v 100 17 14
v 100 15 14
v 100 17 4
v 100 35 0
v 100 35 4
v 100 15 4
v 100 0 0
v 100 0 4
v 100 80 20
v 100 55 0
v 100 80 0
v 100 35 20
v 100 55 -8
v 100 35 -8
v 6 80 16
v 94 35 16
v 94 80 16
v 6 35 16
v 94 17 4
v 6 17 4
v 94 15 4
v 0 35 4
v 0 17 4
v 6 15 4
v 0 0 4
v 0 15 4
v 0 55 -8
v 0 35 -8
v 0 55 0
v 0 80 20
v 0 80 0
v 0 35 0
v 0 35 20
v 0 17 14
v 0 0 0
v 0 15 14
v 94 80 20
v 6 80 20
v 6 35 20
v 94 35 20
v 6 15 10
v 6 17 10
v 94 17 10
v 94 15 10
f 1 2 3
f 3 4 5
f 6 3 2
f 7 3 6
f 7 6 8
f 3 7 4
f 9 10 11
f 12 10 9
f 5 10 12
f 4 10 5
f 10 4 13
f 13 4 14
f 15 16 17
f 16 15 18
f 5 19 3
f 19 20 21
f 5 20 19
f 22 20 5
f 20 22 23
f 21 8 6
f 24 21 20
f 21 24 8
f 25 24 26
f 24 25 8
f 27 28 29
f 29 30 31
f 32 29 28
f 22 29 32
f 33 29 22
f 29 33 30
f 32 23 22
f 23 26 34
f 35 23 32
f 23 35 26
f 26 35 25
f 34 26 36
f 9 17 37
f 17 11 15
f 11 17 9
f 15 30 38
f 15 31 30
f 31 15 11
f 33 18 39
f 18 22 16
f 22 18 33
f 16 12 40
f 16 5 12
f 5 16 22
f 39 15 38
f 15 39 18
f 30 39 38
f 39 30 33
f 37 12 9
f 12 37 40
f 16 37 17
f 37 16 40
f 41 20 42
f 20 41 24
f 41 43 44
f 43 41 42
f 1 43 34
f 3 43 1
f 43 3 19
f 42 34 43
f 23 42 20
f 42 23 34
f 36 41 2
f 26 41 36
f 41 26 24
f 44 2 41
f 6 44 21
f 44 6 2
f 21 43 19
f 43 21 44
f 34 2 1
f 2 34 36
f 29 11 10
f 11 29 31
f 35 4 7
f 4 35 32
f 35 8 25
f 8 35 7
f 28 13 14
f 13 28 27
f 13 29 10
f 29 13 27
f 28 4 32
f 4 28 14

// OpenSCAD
// Parameters
base_width = 100;
base_depth = 80;
base_thickness = 4;

rear_raised_depth = 45;
rear_raised_height = 12;

side_strip_width = 6;
side_strip_height = 4;

transverse_y_pos = 15;
transverse_depth = 2;
transverse_height = 10;
transverse_opening_height = 6;

lower_step_depth = 20;
lower_step_drop = 8;

$fn = 100;

// Modules

// Main thin rectangular base slab
module base_slab() {
    cube([base_width, base_depth, base_thickness]);
}

// Raised section at the rear with side strips
module rear_raised_area() {
    // Larger raised rectangular portion at the rear
    translate([0, base_depth - rear_raised_depth, base_thickness])
        cube([base_width, rear_raised_depth, rear_raised_height]);
    
    // Narrow raised strip on the left side
    translate([0, base_depth - rear_raised_depth, base_thickness + rear_raised_height])
        cube([side_strip_width, rear_raised_depth, side_strip_height]);
        
    // Narrow raised strip on the right side
    translate([base_width - side_strip_width, base_depth - rear_raised_depth, base_thickness + rear_raised_height])
        cube([side_strip_width, rear_raised_depth, side_strip_height]);
}

// Very thin transverse added feature spanning across the width
// Built additively to create a real internal opening without cuts
module transverse_feature() {
    // Left support leg
    translate([0, transverse_y_pos, base_thickness])
        cube([side_strip_width, transverse_depth, transverse_opening_height]);
        
    // Right support leg
    translate([base_width - side_strip_width, transverse_y_pos, base_thickness])
        cube([side_strip_width, transverse_depth, transverse_opening_height]);
        
    // Top spanning bridge completing the internal opening
    translate([0, transverse_y_pos, base_thickness + transverse_opening_height])
        cube([base_width, transverse_depth, transverse_height - transverse_opening_height]);
}

// Aligned continuation extending deeper from the shoulder
// This creates the stepped underside so it is not a single flat level
module downward_step() {
    translate([0, base_depth - rear_raised_depth, -lower_step_drop])
        cube([base_width, lower_step_depth, lower_step_drop]);
}

// Main Assembly
union() {
    // Combine all features as solid added material
    base_slab();
    rear_raised_area();
    transverse_feature();
    downward_step();
}
